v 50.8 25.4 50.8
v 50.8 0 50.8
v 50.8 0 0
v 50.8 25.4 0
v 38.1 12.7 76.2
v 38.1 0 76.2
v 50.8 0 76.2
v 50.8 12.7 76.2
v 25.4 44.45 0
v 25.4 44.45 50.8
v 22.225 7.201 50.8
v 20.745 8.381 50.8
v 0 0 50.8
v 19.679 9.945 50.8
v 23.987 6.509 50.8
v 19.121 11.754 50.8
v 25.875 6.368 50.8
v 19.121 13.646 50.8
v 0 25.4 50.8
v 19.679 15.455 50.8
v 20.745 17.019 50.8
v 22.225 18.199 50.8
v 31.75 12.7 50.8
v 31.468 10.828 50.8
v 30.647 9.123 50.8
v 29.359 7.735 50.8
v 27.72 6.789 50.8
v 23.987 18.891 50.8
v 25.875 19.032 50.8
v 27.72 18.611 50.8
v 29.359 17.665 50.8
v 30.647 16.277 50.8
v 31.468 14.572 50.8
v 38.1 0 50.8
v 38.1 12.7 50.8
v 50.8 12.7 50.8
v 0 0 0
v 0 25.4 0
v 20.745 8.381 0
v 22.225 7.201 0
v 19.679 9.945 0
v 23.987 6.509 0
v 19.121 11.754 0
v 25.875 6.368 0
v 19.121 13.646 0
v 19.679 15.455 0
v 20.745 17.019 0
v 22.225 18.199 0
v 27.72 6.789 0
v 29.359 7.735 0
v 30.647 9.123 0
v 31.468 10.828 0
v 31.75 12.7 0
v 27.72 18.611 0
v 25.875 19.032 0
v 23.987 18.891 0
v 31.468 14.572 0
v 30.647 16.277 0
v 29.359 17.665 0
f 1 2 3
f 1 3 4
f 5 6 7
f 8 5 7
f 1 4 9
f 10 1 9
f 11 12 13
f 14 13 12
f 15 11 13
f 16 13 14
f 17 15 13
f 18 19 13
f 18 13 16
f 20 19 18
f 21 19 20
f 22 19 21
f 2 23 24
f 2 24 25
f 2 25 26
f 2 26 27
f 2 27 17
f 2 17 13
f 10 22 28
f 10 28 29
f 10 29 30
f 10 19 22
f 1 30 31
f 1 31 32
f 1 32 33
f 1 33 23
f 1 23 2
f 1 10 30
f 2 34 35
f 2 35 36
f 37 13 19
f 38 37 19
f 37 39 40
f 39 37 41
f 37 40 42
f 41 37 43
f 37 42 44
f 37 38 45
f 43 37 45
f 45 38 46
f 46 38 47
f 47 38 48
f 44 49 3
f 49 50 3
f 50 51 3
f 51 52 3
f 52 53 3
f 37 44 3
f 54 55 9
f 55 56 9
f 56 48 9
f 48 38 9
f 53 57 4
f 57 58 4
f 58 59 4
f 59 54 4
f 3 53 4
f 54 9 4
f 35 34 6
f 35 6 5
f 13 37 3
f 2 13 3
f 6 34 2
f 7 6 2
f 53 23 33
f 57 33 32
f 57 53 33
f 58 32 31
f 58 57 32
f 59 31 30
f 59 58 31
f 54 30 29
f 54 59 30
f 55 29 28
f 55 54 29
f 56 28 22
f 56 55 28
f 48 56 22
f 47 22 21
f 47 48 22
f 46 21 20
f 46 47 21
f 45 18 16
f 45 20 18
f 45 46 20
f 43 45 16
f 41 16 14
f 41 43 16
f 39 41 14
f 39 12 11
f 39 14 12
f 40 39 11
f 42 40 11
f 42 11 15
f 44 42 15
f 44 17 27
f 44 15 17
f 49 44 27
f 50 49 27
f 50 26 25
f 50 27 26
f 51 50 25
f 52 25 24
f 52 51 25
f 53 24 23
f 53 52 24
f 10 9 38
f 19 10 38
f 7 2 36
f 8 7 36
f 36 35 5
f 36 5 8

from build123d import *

# Parameters (mm, degrees)
F0_W     = 50.8
F0_H     = 25.4
F1_DEPTH = 50.8
F2_R     = 6.35
F3_DEPTH = 50.801
F4_W     = 12.7
F4_H     = 12.7
F5_DEPTH = 25.4


with BuildPart() as f1:
    # F0 (on Top) → F1 (new body)
    with BuildSketch(Plane.XY):
        with Locations((25.4, 12.7)):
            Rectangle(F0_W, F0_H)
        Polygon((25.4, 44.45), (0, 25.4), (50.8, 25.4), align=None)
    extrude(amount=F1_DEPTH)

    # F2 (on Top) → F3 (cut, through all)
    with BuildSketch(Plane.XY):
        with Locations((25.4, 12.7)):
            Circle(F2_R)
    extrude(amount=F3_DEPTH, mode=Mode.SUBTRACT)


with BuildPart() as f5:
    # F4 (on face) → F5 (new body)
    with BuildSketch(Plane.XY.offset(50.8)):
        with Locations((44.45, 6.35)):
            Rectangle(F4_W, F4_H)
    extrude(amount=F5_DEPTH)


solid = Compound([f1.part, f5.part])
